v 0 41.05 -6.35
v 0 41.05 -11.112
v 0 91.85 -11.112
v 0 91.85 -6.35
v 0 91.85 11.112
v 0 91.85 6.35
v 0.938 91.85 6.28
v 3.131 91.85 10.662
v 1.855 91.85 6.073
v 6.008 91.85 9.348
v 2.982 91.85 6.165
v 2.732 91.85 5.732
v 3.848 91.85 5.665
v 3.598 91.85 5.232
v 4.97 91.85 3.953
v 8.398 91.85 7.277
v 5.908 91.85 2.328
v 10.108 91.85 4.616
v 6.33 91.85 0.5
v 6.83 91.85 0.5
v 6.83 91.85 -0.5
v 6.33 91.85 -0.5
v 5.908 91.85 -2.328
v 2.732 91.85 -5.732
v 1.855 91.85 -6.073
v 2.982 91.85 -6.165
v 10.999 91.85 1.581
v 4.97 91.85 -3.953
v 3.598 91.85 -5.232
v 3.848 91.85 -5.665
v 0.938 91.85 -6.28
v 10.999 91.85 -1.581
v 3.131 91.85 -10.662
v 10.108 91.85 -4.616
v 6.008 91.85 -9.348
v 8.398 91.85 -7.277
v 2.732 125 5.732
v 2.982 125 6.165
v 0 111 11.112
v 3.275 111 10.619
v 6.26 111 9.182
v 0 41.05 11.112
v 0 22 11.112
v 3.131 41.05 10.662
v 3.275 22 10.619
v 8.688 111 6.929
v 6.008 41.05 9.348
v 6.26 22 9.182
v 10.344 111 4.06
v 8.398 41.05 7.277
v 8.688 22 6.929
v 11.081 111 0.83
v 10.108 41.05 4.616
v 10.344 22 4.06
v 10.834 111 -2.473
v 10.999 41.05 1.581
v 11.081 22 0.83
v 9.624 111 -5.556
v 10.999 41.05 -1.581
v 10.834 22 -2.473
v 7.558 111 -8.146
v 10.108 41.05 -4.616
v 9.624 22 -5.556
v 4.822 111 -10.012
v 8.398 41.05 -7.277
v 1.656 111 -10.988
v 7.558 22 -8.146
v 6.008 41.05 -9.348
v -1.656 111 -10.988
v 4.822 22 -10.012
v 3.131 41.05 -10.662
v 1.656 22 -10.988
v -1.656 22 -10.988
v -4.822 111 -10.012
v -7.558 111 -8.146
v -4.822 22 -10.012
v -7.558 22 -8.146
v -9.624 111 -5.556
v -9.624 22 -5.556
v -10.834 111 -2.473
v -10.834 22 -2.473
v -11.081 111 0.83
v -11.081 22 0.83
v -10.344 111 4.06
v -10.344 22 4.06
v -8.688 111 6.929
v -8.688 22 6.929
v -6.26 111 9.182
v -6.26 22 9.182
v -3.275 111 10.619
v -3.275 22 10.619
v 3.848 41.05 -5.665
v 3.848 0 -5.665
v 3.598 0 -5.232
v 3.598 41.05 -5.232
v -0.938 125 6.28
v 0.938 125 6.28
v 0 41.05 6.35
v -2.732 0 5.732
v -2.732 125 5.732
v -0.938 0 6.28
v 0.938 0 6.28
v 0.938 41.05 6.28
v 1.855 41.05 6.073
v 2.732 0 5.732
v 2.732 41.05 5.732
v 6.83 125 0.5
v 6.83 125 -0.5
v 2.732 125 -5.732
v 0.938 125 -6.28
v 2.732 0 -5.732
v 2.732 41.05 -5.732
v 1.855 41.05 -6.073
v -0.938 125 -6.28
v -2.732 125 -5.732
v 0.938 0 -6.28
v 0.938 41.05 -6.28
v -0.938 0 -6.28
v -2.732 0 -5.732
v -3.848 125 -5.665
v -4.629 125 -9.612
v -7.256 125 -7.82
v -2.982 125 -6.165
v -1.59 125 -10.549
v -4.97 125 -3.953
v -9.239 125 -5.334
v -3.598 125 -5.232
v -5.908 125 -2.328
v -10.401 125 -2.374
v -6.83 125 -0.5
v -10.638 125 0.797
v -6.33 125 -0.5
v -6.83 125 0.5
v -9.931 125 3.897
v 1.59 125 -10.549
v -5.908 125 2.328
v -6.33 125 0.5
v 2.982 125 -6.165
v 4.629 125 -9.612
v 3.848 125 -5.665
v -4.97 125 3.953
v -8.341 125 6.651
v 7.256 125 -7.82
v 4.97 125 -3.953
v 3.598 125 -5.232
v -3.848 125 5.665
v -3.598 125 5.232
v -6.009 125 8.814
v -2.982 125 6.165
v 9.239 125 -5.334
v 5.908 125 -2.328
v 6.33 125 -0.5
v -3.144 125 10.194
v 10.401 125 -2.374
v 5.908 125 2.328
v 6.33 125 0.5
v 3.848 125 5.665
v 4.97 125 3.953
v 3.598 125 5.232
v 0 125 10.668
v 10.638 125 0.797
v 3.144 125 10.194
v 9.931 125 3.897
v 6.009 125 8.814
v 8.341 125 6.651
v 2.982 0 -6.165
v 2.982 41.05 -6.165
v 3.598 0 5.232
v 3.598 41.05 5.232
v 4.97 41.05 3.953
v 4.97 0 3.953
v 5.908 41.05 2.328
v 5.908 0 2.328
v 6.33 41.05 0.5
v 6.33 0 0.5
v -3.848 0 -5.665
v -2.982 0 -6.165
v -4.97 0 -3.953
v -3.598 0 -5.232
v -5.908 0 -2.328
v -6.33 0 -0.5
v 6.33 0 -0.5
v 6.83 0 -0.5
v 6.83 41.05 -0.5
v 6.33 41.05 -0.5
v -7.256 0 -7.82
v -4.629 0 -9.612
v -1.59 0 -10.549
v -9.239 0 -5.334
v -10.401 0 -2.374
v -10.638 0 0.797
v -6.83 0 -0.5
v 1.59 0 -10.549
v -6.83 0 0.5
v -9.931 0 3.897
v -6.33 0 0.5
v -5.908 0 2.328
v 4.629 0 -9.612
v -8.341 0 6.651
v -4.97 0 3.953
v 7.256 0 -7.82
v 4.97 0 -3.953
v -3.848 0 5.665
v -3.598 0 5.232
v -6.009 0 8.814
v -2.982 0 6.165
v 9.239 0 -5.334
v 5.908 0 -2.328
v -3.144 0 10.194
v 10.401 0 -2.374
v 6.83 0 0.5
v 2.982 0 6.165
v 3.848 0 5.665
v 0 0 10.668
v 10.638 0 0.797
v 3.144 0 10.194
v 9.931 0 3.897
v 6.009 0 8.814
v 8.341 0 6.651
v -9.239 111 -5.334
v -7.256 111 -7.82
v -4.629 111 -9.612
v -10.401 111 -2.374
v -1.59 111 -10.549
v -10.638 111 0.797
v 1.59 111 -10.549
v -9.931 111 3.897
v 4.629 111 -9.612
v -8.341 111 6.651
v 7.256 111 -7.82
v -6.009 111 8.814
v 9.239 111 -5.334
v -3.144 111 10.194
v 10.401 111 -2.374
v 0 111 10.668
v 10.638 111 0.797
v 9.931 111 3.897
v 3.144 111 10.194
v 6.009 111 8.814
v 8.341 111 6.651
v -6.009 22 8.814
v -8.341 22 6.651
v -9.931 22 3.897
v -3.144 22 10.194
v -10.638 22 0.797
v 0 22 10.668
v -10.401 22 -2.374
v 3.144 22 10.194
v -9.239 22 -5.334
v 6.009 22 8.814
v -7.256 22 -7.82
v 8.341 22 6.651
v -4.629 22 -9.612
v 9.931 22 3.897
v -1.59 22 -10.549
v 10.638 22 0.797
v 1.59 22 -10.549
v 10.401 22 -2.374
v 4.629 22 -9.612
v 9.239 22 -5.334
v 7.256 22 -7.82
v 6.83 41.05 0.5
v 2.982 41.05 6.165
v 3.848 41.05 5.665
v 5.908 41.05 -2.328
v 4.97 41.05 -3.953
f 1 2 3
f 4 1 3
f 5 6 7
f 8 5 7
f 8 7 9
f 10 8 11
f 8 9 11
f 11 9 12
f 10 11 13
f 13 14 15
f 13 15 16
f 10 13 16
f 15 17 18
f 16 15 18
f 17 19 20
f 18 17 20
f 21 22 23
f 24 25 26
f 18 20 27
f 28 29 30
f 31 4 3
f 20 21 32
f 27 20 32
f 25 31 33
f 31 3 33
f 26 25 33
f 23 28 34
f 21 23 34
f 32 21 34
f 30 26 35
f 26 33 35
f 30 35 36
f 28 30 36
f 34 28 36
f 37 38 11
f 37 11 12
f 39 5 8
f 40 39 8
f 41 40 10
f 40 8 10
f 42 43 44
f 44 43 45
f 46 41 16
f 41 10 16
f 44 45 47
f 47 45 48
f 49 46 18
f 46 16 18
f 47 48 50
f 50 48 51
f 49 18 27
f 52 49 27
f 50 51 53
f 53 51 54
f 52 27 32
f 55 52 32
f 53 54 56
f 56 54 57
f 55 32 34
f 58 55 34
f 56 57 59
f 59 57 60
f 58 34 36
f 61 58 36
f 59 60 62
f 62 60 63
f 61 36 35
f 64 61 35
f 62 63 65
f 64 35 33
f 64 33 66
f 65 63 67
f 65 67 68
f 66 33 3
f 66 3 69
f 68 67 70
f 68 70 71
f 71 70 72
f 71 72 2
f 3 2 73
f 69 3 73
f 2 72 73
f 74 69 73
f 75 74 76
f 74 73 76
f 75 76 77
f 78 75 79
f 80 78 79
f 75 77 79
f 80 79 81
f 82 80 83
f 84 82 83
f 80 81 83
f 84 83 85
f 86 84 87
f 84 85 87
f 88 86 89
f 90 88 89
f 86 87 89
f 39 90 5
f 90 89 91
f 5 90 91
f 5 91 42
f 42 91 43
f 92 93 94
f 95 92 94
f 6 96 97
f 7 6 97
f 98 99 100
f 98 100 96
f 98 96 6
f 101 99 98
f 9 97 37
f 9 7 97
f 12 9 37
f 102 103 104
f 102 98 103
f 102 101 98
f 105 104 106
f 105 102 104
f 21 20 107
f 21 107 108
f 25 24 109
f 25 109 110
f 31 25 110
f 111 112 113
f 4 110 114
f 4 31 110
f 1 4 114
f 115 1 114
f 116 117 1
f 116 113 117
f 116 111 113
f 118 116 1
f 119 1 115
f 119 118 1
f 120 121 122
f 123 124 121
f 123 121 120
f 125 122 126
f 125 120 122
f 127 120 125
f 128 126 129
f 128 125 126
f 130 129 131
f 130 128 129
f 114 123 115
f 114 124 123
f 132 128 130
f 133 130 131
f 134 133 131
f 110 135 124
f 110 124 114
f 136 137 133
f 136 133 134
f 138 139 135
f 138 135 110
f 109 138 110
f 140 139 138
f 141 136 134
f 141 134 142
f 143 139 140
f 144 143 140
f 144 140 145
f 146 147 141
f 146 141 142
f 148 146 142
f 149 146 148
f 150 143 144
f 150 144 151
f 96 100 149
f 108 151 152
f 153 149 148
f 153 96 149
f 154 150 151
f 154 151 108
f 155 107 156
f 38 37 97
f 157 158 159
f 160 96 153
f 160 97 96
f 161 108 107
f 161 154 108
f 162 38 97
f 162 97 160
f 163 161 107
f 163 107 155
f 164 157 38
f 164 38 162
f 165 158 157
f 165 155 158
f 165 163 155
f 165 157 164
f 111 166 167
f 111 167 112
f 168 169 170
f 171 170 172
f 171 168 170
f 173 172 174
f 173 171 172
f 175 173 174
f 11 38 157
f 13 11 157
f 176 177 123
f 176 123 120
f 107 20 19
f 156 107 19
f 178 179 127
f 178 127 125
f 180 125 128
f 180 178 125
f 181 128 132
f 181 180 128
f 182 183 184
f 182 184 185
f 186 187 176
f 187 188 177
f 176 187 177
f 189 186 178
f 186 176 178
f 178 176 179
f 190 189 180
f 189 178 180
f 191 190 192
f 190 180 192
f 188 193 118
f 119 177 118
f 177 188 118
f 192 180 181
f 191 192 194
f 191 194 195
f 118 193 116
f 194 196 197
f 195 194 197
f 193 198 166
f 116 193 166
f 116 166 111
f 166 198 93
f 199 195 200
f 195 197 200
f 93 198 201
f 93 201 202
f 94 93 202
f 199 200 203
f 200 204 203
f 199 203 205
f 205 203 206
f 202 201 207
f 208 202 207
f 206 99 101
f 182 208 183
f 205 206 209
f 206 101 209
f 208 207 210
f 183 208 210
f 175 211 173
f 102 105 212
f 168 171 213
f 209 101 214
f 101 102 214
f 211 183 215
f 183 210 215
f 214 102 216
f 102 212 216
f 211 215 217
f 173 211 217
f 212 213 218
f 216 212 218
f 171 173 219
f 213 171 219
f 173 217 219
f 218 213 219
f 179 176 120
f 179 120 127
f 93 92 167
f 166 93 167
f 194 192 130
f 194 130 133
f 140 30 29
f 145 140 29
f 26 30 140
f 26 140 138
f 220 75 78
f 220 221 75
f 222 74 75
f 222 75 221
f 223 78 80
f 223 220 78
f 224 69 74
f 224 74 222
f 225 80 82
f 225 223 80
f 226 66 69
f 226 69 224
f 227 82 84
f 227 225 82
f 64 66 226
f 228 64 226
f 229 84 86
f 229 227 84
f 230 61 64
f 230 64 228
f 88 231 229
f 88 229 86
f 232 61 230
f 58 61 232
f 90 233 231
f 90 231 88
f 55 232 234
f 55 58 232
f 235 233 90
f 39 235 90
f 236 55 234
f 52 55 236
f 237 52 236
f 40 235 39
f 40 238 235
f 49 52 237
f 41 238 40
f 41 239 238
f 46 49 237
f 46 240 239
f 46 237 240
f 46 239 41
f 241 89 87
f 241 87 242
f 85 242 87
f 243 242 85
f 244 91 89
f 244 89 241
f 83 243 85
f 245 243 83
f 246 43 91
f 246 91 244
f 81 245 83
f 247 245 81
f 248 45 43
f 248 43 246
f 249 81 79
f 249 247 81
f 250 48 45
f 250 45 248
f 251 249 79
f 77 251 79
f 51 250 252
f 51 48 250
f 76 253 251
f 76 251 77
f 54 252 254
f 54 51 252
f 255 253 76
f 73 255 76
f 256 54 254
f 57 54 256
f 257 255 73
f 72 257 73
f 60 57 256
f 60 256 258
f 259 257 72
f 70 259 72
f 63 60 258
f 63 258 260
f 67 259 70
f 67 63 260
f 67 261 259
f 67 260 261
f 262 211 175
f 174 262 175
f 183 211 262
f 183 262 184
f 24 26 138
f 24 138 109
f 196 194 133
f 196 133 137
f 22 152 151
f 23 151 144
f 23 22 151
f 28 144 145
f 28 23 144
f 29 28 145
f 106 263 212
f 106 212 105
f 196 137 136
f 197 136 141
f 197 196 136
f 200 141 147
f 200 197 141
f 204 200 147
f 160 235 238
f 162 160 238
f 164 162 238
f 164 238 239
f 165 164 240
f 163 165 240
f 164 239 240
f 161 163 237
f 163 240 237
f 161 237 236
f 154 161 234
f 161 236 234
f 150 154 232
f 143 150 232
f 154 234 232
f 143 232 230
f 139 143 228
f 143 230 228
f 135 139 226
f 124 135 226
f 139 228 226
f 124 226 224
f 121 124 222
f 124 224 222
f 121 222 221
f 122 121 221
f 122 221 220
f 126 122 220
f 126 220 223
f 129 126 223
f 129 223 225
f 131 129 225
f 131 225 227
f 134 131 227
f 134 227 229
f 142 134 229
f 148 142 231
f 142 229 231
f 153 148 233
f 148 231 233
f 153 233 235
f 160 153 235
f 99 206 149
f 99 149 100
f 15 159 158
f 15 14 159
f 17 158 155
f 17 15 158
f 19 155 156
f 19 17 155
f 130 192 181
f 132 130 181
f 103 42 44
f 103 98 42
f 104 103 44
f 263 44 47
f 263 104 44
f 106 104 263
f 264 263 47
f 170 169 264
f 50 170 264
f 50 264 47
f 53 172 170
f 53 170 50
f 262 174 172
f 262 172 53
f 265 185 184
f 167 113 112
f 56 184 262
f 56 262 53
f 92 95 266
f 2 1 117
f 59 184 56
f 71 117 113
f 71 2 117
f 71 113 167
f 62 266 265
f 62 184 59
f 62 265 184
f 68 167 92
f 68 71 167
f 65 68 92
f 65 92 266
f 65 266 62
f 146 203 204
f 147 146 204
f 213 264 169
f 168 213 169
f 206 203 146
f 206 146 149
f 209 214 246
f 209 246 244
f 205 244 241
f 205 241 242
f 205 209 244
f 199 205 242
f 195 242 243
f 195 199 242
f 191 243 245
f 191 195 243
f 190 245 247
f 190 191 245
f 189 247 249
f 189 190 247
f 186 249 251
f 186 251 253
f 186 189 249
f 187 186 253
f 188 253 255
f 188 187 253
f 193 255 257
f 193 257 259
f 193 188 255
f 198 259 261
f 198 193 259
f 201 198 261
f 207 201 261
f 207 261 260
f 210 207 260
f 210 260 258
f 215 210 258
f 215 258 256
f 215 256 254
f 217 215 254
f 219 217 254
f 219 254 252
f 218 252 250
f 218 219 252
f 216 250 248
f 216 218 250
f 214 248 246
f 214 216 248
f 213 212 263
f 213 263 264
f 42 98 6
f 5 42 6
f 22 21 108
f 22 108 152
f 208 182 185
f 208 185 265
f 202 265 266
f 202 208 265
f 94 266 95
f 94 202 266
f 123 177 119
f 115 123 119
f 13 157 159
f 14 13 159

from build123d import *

# Parameters (mm, degrees)
SKETCH1_R               = 11.1125
SKETCH1_R_2             = 6.35
BOSS_EXTRUDE1_DEPTH     = 125
CUT_EXTRUDE1_START      = -14
SKETCH2_R               = 11.1125
SKETCH2_R_2             = 10.668
CUT_EXTRUDE1_DEPTH      = 14
SKETCH3_R               = 11.1125
SKETCH3_R_2             = 10.668
CUT_EXTRUDE2_DEPTH      = 22
CUT_EXTRUDE3_DEPTH      = 126.984028006
CUT_EXTRUDE3_DEPTH_BACK = 126.984028006
SKETCH4_W               = 11.1125
SKETCH4_H               = 50.8
SKETCH6_W               = 0.5
SKETCH6_H               = 1
CUT_EXTRUDE4_DEPTH      = 126.984028006
CIRPATTERN1_COUNT       = 6


with BuildPart() as part:
    # Sketch1 → Boss-Extrude1 (new body)
    with BuildSketch(Plane(origin=(0, 0, 0), x_dir=(1, 0, 0), z_dir=(0, 1, 0))):
        with Locations(Location((0, 0, 0), (0, 0, 270))):
            Circle(SKETCH1_R)
        with Locations(Location((0, 0, 0), (0, 0, 270))):
            Circle(SKETCH1_R_2, mode=Mode.SUBTRACT)
    extrude(amount=BOSS_EXTRUDE1_DEPTH)

    # Sketch2 → Cut-Extrude1 (cut)
    with BuildSketch(Plane(origin=(0, 125, 0), x_dir=(1, 0, 0), z_dir=(0, 1, 0)).offset(CUT_EXTRUDE1_START)):
        with Locations(Location((0, 0, 0), (0, 0, 270))):
            Circle(SKETCH2_R)
        with Locations(Location((0, 0, 0), (0, 0, 270))):
            Circle(SKETCH2_R_2, mode=Mode.SUBTRACT)
    extrude(amount=CUT_EXTRUDE1_DEPTH, mode=Mode.SUBTRACT)

    # Sketch3 → Cut-Extrude2 (cut)
    with BuildSketch(Plane.XZ):
        with Locations(Location((0, 0, 0), (0, 0, 270))):
            Circle(SKETCH3_R)
        with Locations(Location((0, 0, 0), (0, 0, 90))):
            Circle(SKETCH3_R_2, mode=Mode.SUBTRACT)
    extrude(amount=-CUT_EXTRUDE2_DEPTH, mode=Mode.SUBTRACT)

    # Sketch4 → Cut-Extrude3 (cut, two sides: drawn at the far end of the back side and taken through both)
    with BuildSketch(Plane.XY.offset(-CUT_EXTRUDE3_DEPTH_BACK)):
        with Locations((5.55625, 66.45)):
            Rectangle(SKETCH4_W, SKETCH4_H)
    extrude(amount=CUT_EXTRUDE3_DEPTH + CUT_EXTRUDE3_DEPTH_BACK, mode=Mode.SUBTRACT)

    # Sketch6 → Cut-Extrude4 (cut, through all)
    with BuildSketch(Plane.XZ):
        with Locations((-6.580284354, 0)):
            Rectangle(SKETCH6_W, SKETCH6_H)
    cut_extrude4 = extrude(amount=-CUT_EXTRUDE4_DEPTH, mode=Mode.SUBTRACT)

    # CirPattern1: Cut-Extrude4 ×6 about axis
    cirpattern1_axis = Axis((0, 0, 0), (0, 1, 0))
    for i in range(1, CIRPATTERN1_COUNT):
        add(cut_extrude4.rotate(cirpattern1_axis, i * 360 / CIRPATTERN1_COUNT), mode=Mode.SUBTRACT)


solid = part.part
